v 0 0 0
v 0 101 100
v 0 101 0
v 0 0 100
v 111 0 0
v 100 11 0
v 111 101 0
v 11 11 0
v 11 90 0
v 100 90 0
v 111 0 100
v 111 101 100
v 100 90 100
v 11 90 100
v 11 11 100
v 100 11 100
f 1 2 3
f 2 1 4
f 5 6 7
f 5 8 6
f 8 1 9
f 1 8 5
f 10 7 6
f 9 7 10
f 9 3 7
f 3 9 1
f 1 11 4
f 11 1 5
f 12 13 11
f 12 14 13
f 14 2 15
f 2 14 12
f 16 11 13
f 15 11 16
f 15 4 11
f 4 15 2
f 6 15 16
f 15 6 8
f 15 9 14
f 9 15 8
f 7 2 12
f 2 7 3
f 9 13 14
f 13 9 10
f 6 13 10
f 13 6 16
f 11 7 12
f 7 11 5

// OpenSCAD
// file: cube_base.scad
input_length = 10;
input_height = 10;
input_depth = 10;
box_size = 1;

module box(input_length, input_depth, input_height, box_size){
	length = input_length;
	height = input_height - box_size;
	depth = input_depth;

	bottom_back_left =   [0,      0,     0];
	top_back_left =      [0,      0,     height];
	bottom_front_left =  [0,      depth, 0];
	top_front_left =     [0,      depth, height];
	bottom_back_right =  [length, 0,     0];
	top_back_right =     [length, 0,     height];
	bottom_front_right = [length, depth, 0];
	top_front_right =    [length, depth, height];

	box = [bottom_back_left, top_back_left, bottom_front_left, top_front_left, bottom_back_right, top_back_right, bottom_front_right, top_front_right];

	hull(){
		for(position = box){
			translate(position){
				cube(box_size);
			}
		}
	}
}

box(input_length, input_depth, input_height, box_size);
// main file
//Includes 
use <../base/cube_base.scad>

//Model information
model_length = 10;
model_depth = 10;
model_height = 10;
model_offset = 0;
box_height = 1;
model_opening = 0;
model_slack = 10;
stacker_height = 100;
stacker_wall_thickness = 10;

/*
translate([model_offset, model_offset, 0]){
	box(model_length, model_depth, model_height, 1);
}
*/

module stacker(model_length, model_depth, model_height, model_opening, stacker_height, stacker_wall_thickness, box_height, model_slack){
	//Calculated
	wall_length_calc = model_length * model_slack;
	model_depth_calc = model_depth * model_slack;
	model_height_calc = model_height * model_slack;

	//Wall 
	wall_length = [wall_length_calc, stacker_wall_thickness, wall_length_calc, stacker_wall_thickness];
	wall_depth = [stacker_wall_thickness, model_depth_calc, stacker_wall_thickness, model_depth_calc];
	wall_height = [stacker_height, stacker_height, stacker_height -model_opening, stacker_height];
	wall_box_height = [box_height, box_height, box_height, box_height];
	wall_offset = [
	[0, 0, 0],
	[0, 0, 0],
	[0, model_depth_calc - stacker_wall_thickness, model_opening],
	[wall_length_calc, 0, 0]
	];

	wall = [
	wall_length,
	wall_depth,
	wall_height,
	wall_box_height,
	wall_offset
	];

	for(segment = [0:3]){
		translate(wall[4][segment]){
			box(wall[0][segment], wall[1][segment], wall[2][segment], wall[3][segment]);
		}
	}
}
stacker(model_length, model_depth, model_height, model_opening, stacker_height, stacker_wall_thickness, box_height, model_slack);
